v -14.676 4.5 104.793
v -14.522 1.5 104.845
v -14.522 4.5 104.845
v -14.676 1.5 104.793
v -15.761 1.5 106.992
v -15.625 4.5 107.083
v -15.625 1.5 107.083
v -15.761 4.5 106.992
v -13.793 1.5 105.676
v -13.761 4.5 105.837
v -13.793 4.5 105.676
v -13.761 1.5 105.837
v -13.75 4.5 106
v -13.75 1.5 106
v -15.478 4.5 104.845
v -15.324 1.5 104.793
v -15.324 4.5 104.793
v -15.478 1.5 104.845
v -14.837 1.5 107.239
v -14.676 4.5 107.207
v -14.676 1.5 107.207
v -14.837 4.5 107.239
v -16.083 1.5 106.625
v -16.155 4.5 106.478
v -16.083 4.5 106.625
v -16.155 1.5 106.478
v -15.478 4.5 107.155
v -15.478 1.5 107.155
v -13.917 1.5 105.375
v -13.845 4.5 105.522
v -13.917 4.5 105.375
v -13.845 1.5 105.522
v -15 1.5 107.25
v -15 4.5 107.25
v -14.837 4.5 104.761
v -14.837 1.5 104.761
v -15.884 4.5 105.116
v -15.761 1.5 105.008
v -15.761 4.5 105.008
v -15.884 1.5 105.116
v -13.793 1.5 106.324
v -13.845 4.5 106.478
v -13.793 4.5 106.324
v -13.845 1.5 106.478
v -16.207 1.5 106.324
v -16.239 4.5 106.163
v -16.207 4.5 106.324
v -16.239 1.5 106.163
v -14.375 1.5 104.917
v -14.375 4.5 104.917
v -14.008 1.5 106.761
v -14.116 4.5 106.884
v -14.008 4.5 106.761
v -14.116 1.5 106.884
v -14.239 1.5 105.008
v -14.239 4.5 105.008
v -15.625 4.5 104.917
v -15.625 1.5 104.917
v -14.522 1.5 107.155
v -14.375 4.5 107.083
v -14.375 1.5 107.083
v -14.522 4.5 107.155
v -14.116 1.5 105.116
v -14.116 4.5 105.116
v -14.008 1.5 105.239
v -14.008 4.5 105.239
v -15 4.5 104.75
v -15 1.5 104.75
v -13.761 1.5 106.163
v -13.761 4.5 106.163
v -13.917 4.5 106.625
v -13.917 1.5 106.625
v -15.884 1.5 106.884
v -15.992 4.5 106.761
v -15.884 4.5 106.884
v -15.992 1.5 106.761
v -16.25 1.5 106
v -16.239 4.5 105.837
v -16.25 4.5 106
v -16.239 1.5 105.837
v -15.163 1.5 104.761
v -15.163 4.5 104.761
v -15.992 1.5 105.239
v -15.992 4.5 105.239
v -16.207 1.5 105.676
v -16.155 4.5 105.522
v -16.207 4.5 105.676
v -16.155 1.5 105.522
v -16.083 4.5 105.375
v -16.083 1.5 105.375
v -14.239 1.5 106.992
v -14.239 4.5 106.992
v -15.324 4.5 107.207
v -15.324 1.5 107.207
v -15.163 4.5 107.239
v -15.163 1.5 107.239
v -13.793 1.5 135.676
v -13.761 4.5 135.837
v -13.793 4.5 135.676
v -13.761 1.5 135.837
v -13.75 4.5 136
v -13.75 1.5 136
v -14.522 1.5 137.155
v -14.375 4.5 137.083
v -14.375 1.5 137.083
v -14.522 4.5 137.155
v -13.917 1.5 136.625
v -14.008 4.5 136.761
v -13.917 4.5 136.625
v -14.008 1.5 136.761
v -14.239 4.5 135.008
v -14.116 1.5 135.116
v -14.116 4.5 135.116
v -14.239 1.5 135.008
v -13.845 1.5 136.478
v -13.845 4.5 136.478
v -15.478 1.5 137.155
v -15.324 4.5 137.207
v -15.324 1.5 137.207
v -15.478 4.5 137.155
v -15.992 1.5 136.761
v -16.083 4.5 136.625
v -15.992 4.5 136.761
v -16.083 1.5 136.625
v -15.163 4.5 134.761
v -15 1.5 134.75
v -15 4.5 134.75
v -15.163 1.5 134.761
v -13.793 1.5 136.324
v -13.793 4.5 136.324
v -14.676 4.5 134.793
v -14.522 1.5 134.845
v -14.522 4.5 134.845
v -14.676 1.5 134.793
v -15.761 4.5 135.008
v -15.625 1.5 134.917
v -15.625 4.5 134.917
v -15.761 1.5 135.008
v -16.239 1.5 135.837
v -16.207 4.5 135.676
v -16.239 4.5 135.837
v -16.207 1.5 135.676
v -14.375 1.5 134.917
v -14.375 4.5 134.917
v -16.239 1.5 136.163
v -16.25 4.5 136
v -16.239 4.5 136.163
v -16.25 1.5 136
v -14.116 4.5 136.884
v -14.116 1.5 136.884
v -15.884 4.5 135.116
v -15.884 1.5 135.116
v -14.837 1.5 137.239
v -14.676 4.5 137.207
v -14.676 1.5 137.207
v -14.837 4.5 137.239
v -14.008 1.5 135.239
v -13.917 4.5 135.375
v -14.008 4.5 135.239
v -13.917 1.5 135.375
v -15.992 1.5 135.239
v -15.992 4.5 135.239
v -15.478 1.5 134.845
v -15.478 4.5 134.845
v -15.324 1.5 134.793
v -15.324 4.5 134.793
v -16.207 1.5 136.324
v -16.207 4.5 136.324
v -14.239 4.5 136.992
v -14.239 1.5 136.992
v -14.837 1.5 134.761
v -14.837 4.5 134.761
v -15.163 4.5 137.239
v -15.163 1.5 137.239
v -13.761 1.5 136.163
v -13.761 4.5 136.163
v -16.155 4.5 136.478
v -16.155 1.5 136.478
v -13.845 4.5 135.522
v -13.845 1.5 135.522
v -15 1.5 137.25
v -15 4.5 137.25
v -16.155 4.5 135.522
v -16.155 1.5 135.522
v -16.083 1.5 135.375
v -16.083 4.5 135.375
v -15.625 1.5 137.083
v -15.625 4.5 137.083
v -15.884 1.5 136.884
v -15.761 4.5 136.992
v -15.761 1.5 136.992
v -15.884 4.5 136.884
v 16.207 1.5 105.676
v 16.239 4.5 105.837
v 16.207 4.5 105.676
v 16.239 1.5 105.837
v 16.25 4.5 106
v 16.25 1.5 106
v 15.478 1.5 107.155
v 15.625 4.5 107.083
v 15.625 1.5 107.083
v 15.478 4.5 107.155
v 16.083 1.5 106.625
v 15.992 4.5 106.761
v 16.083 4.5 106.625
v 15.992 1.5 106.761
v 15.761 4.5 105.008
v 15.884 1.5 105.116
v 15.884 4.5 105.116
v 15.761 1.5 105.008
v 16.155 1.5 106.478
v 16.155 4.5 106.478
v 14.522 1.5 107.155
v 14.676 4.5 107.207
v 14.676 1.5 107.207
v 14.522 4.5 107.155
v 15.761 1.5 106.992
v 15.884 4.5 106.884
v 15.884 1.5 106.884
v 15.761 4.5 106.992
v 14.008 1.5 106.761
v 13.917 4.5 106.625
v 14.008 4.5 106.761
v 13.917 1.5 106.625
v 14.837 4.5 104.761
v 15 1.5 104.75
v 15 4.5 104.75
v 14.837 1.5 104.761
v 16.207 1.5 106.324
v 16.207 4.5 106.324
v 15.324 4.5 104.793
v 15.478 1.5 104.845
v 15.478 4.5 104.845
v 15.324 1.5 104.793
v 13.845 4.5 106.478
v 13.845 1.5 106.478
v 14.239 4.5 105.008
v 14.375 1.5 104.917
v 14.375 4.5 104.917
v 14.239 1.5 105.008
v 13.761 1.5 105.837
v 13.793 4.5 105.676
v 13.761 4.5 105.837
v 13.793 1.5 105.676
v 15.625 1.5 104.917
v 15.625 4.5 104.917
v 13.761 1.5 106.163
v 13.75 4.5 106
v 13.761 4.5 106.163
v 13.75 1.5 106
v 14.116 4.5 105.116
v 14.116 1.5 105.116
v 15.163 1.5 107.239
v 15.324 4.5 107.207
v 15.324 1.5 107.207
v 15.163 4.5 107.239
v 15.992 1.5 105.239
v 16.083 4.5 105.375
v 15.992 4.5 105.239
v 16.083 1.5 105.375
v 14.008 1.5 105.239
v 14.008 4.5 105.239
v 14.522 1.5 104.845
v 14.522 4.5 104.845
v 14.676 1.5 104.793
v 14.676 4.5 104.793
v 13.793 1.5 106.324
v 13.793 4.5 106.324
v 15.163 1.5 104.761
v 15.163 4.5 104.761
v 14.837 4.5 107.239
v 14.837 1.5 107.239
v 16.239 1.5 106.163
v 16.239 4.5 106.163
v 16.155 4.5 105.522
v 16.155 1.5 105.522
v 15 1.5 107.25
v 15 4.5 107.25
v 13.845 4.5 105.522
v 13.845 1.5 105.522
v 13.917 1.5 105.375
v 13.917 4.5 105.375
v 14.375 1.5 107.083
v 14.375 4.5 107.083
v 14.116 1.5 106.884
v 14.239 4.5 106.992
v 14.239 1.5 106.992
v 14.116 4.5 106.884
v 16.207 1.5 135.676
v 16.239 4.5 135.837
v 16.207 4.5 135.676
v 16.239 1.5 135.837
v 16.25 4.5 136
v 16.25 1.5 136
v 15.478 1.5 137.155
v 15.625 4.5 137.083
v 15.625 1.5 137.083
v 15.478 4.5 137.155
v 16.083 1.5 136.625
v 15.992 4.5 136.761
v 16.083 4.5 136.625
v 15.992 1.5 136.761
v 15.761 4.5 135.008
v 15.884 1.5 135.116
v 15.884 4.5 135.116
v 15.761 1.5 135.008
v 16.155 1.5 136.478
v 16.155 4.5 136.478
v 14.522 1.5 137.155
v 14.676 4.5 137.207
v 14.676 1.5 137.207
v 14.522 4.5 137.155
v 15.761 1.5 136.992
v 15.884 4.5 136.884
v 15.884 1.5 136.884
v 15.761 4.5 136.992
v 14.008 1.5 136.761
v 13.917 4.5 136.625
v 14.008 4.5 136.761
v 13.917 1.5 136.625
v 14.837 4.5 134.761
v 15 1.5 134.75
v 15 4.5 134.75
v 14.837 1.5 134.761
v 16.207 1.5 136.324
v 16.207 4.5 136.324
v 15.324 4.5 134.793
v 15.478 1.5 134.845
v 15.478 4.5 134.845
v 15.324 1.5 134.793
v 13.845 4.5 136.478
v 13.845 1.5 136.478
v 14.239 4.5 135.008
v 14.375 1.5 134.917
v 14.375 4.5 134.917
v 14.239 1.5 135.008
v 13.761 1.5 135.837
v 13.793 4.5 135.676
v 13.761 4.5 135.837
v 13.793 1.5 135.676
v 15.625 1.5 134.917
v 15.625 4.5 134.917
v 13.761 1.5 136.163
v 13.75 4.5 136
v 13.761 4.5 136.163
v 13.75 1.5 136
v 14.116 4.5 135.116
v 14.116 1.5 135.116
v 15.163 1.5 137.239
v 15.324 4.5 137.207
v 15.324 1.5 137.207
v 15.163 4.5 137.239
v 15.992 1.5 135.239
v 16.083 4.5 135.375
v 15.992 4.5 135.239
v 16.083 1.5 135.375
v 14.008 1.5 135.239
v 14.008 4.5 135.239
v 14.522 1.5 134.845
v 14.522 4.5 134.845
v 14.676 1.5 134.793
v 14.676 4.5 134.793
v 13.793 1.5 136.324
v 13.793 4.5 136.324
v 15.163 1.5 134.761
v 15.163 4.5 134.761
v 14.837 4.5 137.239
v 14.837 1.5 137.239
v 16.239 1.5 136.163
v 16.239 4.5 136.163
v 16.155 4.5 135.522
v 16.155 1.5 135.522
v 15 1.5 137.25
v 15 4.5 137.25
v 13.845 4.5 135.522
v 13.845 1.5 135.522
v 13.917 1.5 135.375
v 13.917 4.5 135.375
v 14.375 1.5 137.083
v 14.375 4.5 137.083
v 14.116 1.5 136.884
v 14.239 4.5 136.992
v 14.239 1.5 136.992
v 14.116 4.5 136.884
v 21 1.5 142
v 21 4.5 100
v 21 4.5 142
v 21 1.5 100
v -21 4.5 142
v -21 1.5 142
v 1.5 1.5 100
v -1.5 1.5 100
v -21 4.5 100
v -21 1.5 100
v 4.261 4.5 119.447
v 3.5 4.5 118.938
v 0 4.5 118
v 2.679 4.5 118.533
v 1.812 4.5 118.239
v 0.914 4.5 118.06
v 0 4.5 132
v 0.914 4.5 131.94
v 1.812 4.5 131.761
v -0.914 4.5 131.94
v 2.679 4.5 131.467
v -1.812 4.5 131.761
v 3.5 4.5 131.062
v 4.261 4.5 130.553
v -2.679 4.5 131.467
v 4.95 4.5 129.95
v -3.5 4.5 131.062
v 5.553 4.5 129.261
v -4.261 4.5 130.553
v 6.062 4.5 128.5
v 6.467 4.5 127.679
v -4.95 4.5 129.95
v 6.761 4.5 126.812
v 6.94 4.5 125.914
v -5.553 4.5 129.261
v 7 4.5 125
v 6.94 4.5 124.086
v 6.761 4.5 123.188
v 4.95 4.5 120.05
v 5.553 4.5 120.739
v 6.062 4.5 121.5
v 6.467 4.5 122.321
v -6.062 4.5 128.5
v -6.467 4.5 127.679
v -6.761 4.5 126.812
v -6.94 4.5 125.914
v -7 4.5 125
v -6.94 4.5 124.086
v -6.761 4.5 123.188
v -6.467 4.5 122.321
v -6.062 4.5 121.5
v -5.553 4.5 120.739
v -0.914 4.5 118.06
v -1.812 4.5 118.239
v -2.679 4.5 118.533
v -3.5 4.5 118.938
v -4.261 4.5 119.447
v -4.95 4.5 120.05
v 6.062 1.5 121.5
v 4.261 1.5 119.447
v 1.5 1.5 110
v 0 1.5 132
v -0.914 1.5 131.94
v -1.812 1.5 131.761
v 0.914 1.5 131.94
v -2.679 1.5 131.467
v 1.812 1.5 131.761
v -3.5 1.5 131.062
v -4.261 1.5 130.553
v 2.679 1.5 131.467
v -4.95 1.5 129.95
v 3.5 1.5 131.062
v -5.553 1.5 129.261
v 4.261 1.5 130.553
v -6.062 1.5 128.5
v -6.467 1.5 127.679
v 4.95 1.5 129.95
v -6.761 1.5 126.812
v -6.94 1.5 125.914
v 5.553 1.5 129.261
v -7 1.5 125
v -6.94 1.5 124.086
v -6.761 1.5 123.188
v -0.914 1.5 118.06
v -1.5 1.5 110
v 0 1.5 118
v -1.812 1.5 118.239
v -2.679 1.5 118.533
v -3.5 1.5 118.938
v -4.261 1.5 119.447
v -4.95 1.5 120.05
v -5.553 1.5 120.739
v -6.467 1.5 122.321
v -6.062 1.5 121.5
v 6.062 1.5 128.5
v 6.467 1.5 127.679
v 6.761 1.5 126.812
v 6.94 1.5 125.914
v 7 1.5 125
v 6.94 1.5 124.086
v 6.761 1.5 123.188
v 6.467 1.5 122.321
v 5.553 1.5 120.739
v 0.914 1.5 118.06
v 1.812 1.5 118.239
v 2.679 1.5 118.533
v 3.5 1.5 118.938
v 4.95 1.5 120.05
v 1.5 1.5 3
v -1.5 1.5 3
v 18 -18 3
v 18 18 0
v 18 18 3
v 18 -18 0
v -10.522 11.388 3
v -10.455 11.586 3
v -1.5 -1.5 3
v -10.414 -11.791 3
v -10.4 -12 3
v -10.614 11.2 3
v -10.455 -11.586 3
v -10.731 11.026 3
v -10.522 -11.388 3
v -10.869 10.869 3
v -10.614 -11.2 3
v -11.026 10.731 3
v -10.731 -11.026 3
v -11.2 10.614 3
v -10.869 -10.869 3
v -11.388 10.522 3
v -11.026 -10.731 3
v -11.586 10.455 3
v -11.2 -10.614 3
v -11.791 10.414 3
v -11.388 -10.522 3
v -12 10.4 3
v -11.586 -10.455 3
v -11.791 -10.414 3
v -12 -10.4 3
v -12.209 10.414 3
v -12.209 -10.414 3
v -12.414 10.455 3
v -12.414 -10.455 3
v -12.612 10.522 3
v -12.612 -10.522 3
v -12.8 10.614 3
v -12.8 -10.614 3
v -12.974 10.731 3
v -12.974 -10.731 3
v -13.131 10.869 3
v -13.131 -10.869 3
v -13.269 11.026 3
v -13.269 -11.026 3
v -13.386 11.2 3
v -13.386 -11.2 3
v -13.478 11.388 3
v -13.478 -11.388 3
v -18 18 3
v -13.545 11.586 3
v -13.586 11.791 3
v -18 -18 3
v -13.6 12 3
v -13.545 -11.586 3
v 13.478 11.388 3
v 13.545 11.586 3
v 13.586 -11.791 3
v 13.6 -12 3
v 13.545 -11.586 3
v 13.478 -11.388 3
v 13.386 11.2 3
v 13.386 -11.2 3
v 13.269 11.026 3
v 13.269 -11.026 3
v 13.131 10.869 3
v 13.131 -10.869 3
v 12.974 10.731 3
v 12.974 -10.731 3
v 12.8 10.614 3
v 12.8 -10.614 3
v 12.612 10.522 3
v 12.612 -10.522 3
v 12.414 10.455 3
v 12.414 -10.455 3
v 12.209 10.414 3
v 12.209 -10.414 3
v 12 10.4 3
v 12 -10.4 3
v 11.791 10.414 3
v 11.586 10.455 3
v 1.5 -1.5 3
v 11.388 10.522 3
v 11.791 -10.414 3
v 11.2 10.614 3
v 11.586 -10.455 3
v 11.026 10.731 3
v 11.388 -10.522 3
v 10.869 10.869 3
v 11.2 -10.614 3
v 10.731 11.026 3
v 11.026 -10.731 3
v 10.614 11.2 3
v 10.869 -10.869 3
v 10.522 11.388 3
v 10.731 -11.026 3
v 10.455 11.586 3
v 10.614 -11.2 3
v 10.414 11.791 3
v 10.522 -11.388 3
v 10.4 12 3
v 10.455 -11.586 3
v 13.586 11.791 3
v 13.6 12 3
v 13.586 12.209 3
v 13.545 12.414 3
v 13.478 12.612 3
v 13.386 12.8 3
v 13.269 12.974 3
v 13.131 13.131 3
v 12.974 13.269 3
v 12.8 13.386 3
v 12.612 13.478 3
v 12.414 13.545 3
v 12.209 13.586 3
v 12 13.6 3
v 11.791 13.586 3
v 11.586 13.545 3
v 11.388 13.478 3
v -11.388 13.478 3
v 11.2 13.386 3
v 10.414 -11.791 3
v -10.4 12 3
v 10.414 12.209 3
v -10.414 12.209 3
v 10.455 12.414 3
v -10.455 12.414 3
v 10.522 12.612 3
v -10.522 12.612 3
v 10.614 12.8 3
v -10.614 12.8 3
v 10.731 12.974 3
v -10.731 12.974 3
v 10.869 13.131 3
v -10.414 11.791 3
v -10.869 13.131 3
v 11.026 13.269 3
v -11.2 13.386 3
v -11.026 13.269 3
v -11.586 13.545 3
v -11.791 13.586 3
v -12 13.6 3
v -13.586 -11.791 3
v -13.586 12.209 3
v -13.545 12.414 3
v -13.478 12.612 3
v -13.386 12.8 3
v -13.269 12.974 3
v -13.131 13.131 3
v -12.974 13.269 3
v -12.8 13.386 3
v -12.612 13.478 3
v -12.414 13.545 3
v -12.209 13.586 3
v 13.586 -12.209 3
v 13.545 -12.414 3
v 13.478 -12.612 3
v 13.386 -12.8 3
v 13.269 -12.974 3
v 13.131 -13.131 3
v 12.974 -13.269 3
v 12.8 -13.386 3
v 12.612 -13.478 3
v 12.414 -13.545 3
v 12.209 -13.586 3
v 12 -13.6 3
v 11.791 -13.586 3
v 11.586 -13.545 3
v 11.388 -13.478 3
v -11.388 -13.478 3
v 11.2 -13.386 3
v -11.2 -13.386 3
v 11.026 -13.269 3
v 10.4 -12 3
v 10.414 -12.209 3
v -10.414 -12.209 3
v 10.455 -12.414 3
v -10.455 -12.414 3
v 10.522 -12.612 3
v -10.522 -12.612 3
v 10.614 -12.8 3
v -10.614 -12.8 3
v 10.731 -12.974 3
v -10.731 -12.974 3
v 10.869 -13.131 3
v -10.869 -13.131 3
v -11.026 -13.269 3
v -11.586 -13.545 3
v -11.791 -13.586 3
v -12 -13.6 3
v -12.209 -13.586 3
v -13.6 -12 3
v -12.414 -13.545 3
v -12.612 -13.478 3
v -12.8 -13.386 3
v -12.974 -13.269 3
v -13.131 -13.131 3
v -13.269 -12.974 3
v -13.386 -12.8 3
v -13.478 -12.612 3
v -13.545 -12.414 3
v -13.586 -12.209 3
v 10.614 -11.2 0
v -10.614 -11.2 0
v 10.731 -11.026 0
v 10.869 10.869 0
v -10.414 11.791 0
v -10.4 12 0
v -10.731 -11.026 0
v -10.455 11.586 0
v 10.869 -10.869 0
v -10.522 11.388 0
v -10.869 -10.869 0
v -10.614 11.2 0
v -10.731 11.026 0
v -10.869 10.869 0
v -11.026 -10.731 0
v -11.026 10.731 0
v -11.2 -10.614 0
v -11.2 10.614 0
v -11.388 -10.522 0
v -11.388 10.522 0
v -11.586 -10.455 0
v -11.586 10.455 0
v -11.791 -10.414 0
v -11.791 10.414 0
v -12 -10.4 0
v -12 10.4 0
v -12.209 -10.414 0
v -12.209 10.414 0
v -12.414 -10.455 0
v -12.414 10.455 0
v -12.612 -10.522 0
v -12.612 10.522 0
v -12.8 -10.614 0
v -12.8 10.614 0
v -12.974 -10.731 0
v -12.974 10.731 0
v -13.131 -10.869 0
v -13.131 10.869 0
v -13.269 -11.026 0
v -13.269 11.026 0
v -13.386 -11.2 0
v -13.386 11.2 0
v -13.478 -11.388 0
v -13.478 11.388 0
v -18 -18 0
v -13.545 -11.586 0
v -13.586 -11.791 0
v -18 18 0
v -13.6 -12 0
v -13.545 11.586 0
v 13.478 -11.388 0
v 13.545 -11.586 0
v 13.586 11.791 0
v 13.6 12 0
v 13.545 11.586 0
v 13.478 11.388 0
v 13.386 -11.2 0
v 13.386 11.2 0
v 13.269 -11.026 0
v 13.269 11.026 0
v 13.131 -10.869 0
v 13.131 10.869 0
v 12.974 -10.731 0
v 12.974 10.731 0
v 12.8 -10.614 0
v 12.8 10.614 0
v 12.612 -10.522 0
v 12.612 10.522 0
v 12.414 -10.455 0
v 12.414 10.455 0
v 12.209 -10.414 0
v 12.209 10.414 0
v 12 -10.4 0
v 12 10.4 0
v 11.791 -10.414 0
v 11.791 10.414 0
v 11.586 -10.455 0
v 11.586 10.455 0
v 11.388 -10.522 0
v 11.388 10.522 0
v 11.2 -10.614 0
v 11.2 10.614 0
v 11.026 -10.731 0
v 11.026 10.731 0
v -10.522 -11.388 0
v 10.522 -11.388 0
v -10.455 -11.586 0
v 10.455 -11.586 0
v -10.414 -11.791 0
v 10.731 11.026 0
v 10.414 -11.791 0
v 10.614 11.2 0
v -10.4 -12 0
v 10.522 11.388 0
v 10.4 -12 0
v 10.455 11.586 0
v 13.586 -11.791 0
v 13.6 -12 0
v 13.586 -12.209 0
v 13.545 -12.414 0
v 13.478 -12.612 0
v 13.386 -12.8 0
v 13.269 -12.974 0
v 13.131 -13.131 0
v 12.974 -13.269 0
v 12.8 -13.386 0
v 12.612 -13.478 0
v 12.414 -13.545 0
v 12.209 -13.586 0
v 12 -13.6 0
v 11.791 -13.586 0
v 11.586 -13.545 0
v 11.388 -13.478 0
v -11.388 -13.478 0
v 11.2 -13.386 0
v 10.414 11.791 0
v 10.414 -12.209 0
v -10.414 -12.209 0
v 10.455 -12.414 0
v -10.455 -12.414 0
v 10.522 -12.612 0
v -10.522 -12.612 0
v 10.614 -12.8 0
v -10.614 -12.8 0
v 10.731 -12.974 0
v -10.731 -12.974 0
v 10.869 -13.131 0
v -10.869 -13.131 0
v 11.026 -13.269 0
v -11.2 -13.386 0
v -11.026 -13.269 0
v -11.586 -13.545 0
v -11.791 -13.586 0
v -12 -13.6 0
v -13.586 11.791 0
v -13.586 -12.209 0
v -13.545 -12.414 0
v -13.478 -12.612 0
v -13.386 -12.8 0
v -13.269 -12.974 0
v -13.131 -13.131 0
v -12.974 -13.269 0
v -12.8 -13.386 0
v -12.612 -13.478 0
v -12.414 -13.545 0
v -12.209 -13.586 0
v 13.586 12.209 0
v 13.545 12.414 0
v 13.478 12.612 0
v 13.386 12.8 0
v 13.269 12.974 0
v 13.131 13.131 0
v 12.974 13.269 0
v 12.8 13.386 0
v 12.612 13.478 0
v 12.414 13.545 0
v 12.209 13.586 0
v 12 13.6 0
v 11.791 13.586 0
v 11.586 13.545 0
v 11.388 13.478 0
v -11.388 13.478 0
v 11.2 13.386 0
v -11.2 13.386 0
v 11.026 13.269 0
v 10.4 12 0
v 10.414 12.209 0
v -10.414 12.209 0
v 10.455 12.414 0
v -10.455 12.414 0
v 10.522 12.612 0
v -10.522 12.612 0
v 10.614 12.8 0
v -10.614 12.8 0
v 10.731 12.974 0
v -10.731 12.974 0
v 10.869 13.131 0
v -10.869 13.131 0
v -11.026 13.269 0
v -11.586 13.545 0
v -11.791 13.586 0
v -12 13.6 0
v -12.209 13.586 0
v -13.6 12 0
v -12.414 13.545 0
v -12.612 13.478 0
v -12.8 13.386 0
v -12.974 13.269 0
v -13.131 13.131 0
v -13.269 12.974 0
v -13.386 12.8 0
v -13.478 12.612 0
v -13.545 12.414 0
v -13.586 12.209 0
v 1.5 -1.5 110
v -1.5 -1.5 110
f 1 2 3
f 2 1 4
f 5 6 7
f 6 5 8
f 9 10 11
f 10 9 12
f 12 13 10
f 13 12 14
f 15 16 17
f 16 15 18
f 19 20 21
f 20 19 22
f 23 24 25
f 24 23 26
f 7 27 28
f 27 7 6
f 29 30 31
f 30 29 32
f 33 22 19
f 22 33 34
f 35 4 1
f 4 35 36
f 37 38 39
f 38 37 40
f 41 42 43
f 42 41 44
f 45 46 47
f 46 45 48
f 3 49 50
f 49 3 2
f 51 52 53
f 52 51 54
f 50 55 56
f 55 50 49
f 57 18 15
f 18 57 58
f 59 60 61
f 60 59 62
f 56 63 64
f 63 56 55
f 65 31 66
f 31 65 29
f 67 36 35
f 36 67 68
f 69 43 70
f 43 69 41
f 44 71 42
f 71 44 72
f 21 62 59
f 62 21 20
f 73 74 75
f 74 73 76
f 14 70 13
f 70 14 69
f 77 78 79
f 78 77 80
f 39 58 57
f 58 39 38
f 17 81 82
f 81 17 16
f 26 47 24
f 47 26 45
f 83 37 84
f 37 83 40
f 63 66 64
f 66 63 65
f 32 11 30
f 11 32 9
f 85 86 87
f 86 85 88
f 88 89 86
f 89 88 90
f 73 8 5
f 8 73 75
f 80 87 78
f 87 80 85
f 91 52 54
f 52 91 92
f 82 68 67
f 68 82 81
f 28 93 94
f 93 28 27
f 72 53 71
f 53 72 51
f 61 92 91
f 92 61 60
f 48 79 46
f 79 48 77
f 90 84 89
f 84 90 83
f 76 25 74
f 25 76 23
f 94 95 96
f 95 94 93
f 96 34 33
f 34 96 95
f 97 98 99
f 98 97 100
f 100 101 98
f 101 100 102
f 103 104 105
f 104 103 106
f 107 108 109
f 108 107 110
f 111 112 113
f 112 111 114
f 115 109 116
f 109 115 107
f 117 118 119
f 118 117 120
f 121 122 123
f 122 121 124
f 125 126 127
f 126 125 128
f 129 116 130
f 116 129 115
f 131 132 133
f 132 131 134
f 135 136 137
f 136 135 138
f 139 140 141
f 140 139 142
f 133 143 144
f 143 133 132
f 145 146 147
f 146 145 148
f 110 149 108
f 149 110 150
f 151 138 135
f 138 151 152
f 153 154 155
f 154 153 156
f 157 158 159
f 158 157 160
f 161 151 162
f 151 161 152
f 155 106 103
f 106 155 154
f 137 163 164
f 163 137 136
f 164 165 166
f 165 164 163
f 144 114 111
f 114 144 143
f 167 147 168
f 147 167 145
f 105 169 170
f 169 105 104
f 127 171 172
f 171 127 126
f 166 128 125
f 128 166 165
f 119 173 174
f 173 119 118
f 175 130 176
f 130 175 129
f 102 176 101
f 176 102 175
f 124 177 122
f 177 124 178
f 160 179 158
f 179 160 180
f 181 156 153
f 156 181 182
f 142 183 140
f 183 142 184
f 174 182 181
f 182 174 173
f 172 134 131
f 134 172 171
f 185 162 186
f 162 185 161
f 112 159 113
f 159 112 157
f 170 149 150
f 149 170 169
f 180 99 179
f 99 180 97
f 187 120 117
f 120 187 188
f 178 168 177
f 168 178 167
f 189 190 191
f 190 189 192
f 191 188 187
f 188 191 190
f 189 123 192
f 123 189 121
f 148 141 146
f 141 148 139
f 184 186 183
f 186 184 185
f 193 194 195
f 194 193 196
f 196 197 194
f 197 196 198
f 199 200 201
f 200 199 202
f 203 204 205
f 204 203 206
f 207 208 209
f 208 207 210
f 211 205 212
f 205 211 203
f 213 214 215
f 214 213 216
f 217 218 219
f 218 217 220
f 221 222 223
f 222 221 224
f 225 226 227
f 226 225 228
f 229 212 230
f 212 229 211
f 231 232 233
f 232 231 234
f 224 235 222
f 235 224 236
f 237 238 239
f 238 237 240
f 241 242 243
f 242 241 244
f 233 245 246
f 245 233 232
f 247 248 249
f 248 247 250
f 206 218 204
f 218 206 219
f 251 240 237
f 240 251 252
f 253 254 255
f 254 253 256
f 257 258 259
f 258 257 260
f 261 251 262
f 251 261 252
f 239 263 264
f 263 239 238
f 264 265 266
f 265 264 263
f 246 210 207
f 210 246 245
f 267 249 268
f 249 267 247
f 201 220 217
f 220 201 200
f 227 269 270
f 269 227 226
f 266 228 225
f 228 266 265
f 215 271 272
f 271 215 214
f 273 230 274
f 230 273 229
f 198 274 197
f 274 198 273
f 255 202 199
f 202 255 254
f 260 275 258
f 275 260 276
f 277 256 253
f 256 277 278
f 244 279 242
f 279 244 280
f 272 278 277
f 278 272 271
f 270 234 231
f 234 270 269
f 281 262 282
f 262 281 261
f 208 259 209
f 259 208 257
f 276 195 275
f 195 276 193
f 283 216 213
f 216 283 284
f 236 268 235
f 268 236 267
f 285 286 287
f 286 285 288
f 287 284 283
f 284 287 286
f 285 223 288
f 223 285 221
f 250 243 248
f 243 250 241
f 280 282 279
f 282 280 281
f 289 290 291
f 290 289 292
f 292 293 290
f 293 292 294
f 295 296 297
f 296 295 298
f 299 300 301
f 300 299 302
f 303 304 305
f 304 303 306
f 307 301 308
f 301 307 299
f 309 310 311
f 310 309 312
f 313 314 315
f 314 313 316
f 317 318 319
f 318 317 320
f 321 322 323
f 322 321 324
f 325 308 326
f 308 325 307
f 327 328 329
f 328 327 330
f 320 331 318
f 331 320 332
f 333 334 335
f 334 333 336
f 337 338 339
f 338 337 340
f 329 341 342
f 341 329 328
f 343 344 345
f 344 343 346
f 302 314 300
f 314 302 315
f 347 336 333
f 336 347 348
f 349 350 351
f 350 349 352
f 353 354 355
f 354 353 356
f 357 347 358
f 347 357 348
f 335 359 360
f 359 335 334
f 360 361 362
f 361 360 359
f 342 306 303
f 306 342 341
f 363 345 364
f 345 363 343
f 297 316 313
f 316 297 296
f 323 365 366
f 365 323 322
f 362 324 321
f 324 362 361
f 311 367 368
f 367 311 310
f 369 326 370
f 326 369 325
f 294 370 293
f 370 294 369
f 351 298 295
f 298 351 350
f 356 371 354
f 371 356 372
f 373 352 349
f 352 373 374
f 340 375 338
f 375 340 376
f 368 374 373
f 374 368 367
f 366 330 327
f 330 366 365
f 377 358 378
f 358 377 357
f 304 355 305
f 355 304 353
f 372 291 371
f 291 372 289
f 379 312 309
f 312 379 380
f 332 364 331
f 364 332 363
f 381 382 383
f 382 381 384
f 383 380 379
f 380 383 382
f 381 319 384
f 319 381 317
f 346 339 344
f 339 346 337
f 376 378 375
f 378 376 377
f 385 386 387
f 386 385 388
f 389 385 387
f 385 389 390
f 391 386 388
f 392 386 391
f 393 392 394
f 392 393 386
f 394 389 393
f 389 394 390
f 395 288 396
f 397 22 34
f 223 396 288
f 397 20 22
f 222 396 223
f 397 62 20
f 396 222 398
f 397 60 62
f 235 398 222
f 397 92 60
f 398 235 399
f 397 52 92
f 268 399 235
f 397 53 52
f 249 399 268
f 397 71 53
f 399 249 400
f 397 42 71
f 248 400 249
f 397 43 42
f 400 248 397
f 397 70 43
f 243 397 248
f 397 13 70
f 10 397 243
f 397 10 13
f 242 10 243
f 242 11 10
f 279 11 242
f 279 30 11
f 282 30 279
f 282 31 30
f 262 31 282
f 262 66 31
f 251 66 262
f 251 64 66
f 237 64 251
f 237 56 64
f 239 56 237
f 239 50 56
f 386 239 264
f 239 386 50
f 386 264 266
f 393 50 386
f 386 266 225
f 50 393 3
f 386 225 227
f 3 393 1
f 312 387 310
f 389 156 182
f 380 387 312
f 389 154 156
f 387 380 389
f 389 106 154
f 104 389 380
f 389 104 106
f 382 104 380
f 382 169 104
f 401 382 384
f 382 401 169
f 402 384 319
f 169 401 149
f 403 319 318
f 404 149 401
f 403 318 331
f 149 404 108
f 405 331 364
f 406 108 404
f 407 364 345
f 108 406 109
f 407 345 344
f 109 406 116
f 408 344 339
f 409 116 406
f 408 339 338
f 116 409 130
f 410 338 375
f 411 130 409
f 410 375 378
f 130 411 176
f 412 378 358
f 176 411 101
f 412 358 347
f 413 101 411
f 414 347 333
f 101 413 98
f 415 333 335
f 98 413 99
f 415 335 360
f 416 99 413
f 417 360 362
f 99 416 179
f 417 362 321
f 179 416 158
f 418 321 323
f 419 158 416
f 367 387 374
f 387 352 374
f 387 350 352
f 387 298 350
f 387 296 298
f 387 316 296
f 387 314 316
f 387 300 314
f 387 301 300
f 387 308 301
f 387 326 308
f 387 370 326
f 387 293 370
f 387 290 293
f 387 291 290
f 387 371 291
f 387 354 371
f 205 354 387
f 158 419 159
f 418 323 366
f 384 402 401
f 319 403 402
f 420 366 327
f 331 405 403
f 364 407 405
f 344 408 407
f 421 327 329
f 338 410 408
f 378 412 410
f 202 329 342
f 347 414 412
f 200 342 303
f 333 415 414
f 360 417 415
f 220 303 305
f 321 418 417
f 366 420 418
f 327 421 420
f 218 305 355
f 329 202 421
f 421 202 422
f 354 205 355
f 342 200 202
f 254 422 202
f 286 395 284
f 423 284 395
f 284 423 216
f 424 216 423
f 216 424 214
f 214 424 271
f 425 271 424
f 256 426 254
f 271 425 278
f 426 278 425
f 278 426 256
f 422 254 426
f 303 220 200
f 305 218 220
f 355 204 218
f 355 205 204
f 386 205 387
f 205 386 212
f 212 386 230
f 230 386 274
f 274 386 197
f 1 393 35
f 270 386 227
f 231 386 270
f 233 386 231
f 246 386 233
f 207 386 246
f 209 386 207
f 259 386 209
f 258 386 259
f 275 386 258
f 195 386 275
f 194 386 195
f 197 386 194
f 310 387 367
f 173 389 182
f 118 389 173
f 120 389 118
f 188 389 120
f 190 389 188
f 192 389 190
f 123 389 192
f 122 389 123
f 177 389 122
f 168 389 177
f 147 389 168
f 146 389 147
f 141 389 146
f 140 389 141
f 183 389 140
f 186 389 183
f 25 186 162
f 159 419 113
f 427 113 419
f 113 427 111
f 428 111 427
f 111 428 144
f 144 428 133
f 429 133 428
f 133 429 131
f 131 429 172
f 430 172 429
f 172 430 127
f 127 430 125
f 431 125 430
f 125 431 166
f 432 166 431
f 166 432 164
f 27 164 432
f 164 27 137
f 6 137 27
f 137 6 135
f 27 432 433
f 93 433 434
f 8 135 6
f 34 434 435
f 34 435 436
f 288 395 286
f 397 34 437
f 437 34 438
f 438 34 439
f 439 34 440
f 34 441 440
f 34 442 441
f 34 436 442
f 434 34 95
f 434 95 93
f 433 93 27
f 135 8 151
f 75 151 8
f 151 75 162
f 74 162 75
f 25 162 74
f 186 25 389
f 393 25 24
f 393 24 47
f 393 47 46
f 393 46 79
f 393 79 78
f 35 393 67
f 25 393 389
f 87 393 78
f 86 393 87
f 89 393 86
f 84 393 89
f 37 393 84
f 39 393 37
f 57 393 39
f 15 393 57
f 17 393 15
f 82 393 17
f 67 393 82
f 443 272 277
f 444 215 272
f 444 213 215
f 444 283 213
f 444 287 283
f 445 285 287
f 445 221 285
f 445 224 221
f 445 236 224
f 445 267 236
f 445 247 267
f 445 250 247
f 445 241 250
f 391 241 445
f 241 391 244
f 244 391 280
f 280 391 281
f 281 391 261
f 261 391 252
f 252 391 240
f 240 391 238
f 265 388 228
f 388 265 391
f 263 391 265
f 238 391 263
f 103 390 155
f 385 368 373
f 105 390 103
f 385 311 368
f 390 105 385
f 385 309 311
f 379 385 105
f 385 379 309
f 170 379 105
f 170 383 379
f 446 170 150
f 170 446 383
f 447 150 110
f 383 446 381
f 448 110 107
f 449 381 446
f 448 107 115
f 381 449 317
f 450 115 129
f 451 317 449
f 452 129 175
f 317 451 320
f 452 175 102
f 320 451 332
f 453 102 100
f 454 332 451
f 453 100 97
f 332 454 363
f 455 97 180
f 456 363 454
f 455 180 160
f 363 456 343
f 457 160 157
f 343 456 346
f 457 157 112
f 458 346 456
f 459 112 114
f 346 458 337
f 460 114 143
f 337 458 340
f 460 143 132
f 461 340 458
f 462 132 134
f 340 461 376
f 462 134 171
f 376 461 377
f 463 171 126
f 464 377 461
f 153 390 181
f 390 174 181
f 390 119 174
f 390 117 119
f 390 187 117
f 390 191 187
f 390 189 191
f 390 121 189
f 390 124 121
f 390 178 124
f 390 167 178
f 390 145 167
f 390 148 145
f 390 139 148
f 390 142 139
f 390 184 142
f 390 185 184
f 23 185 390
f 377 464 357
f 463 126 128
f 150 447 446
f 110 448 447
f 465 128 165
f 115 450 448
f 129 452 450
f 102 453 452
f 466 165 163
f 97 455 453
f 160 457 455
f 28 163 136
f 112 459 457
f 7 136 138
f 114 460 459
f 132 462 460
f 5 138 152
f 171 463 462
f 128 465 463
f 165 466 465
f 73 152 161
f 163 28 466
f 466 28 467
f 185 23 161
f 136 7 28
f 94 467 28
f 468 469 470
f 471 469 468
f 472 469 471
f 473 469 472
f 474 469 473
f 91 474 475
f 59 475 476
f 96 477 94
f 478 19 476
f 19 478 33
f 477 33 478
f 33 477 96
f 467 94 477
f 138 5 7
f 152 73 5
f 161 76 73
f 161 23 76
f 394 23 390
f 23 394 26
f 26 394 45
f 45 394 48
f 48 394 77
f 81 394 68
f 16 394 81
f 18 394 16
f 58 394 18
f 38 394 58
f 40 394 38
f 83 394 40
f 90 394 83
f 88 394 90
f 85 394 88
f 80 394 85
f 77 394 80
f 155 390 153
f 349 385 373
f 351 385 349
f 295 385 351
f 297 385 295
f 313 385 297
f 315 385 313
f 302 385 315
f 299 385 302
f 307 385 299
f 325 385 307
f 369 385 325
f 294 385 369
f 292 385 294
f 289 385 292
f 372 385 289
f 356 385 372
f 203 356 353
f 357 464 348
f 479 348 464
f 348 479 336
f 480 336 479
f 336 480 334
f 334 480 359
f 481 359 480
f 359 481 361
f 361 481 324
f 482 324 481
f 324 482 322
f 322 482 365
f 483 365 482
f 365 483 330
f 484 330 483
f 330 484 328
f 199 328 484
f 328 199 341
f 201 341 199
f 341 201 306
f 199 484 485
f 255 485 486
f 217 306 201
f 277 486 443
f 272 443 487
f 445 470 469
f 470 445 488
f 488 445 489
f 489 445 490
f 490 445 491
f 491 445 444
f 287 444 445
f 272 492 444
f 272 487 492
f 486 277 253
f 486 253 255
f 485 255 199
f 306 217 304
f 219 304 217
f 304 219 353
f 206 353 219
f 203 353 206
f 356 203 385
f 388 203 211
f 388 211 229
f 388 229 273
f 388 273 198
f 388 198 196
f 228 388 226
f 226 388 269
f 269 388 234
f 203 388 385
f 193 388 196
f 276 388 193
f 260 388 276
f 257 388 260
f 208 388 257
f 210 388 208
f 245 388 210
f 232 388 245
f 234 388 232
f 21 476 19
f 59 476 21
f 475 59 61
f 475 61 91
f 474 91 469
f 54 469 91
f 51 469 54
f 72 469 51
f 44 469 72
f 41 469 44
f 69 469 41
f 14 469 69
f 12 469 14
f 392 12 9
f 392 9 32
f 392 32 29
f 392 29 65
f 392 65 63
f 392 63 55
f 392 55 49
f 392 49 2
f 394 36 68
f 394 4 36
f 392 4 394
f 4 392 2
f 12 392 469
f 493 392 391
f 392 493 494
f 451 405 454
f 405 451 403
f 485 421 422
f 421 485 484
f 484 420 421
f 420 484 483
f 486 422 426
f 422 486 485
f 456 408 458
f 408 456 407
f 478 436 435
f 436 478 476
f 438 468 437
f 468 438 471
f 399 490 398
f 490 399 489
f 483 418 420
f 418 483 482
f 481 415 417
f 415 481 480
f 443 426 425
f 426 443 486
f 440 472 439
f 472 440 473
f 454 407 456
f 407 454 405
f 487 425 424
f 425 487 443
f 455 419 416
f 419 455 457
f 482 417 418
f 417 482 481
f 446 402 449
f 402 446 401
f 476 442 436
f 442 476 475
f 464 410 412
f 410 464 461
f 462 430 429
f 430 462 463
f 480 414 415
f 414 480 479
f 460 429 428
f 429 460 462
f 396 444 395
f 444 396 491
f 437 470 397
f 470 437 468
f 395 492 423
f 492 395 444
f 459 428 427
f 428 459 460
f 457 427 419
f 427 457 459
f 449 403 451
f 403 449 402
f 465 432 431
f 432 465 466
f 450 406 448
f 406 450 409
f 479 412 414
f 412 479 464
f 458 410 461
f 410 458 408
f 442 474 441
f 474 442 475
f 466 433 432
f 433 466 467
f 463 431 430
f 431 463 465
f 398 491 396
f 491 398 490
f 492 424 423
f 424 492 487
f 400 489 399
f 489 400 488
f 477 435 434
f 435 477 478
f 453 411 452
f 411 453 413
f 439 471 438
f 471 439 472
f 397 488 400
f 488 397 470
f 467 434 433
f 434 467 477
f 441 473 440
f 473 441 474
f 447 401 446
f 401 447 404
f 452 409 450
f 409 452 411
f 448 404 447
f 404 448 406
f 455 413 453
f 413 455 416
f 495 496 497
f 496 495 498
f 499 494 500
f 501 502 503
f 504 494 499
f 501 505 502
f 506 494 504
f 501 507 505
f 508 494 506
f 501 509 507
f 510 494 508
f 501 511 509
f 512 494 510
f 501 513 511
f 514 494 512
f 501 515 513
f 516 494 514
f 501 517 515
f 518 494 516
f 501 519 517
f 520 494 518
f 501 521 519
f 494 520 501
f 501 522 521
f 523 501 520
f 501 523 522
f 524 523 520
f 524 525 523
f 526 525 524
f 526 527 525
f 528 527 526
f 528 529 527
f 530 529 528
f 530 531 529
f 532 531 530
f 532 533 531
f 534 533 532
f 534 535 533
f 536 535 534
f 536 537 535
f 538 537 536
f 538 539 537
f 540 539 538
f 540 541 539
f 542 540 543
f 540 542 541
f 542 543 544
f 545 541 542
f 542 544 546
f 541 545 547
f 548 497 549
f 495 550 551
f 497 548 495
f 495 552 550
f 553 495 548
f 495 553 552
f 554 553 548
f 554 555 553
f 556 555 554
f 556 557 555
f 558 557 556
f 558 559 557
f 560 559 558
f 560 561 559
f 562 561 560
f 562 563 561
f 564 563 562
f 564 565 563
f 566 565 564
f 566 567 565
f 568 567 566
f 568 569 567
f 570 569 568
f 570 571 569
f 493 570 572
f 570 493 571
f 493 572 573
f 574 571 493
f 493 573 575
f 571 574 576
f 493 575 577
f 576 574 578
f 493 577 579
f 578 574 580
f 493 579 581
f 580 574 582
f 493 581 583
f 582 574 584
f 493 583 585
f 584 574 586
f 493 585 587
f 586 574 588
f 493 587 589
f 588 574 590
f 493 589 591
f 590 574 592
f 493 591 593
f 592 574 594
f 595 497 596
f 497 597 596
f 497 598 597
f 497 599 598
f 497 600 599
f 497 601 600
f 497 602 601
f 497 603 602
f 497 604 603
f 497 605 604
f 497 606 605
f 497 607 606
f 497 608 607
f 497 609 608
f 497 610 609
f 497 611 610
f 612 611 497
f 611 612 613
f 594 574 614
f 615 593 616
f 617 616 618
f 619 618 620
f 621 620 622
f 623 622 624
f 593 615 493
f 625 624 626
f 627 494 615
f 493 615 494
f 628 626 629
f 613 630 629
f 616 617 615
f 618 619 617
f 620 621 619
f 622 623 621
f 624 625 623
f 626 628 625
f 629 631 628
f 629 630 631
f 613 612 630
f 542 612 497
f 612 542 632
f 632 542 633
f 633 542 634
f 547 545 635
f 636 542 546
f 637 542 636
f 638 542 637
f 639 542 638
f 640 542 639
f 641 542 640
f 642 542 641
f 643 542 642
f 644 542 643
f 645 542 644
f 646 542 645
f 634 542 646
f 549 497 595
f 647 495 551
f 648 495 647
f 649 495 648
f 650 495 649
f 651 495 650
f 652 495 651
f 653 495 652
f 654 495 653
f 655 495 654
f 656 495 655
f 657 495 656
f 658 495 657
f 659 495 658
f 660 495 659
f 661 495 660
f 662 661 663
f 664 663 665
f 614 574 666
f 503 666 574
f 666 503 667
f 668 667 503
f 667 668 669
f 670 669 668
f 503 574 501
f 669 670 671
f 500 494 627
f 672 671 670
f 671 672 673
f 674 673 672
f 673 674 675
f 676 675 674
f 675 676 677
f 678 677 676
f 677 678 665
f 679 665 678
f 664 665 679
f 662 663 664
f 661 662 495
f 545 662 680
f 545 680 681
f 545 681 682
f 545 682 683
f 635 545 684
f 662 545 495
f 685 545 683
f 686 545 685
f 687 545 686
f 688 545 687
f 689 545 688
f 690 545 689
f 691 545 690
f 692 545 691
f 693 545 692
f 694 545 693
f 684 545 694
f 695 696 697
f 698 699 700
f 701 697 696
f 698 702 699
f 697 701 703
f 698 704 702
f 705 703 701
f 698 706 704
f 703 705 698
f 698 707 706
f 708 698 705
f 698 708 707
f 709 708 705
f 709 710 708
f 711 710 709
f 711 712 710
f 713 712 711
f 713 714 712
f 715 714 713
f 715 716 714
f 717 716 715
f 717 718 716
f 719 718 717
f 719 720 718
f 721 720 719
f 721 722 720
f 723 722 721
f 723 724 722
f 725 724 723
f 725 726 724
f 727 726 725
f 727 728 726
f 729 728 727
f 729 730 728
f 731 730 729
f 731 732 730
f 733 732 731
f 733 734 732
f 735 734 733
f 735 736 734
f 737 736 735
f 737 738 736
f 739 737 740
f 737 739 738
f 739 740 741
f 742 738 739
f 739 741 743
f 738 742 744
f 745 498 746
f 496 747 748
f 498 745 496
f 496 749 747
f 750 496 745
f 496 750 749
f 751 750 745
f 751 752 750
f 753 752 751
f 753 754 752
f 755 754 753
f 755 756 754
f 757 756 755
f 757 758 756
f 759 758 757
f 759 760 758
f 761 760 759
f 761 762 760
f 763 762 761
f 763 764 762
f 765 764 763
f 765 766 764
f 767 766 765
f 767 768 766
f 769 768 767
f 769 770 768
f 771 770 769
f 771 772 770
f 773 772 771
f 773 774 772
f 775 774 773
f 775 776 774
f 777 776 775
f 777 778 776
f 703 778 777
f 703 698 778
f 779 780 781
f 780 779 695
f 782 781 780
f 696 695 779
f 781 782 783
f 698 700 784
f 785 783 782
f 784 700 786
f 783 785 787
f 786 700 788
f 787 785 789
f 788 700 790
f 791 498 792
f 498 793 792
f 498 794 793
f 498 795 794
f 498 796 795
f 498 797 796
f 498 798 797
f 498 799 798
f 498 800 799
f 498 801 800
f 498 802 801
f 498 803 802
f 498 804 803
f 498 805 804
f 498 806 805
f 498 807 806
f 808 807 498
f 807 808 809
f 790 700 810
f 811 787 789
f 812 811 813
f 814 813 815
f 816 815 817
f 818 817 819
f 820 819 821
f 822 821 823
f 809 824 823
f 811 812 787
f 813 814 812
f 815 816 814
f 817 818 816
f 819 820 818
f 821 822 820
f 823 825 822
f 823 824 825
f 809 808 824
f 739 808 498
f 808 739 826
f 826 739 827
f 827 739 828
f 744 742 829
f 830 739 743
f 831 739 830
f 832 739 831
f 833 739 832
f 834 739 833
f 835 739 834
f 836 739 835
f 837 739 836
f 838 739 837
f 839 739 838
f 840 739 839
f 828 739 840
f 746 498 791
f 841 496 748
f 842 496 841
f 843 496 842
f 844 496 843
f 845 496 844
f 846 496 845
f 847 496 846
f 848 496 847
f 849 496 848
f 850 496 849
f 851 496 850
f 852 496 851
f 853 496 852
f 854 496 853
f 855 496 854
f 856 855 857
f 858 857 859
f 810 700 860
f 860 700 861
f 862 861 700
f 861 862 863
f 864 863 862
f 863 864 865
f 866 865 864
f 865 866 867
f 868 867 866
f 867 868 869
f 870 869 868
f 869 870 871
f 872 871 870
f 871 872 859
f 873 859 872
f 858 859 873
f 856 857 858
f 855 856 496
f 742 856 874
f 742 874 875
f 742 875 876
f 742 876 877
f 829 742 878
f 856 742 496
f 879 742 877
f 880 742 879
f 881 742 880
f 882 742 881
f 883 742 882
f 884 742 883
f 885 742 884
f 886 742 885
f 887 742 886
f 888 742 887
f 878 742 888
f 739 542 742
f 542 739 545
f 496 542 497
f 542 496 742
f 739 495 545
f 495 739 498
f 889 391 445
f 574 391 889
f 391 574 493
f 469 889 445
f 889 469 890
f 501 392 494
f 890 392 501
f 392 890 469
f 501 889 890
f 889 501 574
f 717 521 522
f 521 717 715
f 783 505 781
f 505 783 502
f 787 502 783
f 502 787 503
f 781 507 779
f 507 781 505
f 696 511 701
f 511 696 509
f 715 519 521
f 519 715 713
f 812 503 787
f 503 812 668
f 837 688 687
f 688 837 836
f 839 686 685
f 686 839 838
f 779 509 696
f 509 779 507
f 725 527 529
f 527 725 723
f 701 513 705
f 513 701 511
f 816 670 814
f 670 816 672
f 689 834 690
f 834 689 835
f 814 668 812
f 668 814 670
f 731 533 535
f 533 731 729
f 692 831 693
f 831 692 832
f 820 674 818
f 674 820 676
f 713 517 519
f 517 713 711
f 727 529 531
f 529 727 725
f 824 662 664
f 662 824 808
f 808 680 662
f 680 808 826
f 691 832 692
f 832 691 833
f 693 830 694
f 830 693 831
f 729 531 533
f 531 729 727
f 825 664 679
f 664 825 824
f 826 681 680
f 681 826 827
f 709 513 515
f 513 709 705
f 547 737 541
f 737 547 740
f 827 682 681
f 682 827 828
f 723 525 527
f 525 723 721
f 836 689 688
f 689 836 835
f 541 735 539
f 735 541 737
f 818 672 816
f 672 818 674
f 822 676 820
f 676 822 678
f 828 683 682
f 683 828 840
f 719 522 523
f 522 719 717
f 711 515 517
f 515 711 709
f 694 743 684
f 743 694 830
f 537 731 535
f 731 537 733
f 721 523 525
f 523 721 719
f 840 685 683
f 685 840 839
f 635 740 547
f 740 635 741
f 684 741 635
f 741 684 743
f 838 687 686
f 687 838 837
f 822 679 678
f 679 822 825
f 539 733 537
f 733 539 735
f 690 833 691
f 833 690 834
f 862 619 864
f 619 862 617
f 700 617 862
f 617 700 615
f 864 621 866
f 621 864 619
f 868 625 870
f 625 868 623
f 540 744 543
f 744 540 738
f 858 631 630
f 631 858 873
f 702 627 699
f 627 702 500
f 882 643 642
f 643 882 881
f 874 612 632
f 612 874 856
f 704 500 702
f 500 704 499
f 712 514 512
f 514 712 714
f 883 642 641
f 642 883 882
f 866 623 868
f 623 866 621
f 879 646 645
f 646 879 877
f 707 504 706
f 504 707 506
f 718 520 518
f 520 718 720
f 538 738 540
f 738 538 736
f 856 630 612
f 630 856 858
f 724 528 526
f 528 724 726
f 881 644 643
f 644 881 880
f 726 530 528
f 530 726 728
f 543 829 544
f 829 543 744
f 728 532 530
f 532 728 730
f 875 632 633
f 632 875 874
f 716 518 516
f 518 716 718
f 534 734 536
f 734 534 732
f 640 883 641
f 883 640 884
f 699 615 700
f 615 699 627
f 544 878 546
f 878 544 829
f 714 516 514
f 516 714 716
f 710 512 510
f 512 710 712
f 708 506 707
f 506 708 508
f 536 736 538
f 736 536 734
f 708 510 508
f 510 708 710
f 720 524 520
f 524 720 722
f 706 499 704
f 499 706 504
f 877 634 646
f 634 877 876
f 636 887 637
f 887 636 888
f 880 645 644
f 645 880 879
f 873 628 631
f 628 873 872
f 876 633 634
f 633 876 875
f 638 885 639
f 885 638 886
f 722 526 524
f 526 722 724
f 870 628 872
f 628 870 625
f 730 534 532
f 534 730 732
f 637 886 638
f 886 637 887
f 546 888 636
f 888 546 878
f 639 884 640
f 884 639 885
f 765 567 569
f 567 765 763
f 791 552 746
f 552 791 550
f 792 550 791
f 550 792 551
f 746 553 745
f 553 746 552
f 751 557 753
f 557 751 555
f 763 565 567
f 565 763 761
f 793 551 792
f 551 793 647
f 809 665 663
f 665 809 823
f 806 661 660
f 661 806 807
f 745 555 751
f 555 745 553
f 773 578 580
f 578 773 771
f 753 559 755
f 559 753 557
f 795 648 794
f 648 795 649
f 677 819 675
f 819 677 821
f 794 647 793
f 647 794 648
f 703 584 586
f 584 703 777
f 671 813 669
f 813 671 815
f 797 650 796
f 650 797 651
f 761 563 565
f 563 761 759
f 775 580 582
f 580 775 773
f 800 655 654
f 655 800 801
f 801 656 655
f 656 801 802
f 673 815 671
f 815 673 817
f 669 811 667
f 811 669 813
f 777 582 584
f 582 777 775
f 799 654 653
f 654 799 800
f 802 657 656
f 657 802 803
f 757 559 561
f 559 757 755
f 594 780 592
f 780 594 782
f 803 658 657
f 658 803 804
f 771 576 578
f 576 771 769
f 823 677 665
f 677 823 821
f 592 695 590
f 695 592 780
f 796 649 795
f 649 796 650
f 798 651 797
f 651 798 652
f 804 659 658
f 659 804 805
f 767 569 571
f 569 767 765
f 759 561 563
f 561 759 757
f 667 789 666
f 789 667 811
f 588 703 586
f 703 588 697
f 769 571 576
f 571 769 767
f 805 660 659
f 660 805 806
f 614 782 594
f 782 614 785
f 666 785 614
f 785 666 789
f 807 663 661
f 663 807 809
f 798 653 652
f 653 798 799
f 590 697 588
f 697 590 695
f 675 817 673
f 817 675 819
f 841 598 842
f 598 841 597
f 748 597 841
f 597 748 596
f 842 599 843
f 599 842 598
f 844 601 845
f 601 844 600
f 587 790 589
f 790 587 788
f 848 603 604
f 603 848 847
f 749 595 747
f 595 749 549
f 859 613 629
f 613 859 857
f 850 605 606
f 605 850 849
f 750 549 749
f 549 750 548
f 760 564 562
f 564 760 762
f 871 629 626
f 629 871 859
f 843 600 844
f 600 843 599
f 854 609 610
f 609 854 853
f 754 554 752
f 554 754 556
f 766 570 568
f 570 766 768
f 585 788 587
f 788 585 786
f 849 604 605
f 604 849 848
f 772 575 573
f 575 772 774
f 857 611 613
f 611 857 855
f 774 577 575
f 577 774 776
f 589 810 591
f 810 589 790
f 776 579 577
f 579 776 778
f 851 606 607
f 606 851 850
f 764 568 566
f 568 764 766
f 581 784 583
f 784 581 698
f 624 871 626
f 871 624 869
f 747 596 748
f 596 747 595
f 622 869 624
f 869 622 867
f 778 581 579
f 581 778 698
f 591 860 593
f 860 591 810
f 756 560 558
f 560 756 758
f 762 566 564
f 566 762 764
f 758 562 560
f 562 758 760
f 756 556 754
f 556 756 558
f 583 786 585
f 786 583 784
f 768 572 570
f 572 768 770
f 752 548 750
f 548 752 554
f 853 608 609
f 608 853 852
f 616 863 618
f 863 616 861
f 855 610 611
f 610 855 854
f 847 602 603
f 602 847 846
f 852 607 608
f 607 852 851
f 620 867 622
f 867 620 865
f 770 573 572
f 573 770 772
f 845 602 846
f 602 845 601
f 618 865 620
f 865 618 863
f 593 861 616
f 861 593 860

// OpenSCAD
// ESP32-CAM mast — forward-facing, ~120 mm lens height
// Optional servo horns: set use_pan_tilt = true for bracket clearance.

$fn = 48;

use_pan_tilt = false;
base = 36;
mast_h = use_pan_tilt ? 70 : 110;
mast_t = 3;
cam_w = 42;
cam_h = 42;

module cam_mount_plate() {
  difference() {
    cube([cam_w, 3, cam_h]);
    for (p = [[6, 6], [6, cam_h - 6], [cam_w - 6, 6], [cam_w - 6, cam_h - 6]])
      translate([p[0], -1, p[1]]) rotate([-90, 0, 0]) cylinder(h=10, d=2.5);
    translate([cam_w/2, -1, cam_h/2 + 4]) rotate([-90, 0, 0]) cylinder(h=10, d=14);
  }
}

difference() {
  union() {
    translate([-base/2, -base/2, 0]) cube([base, base, mast_t]);
    translate([-mast_t/2, -mast_t/2, 0]) cube([mast_t, mast_t, mast_h]);
    translate([-cam_w/2, mast_t/2, mast_h - 10]) cam_mount_plate();
  }
  for (p = [[-12, -12], [-12, 12], [12, -12], [12, 12]])
    translate([p[0], p[1], -1]) cylinder(h=mast_t + 2, d=3.2);
}

if (use_pan_tilt) {
  translate([40, 0, 0]) {
    difference() {
      cube([30, 30, 4]);
      translate([15, 15, -1]) cylinder(h=6, d=6);
      for (a = [0:90:270])
        rotate([0, 0, a]) translate([10, 0, -1]) cylinder(h=6, d=2.2);
    }
  }
}
